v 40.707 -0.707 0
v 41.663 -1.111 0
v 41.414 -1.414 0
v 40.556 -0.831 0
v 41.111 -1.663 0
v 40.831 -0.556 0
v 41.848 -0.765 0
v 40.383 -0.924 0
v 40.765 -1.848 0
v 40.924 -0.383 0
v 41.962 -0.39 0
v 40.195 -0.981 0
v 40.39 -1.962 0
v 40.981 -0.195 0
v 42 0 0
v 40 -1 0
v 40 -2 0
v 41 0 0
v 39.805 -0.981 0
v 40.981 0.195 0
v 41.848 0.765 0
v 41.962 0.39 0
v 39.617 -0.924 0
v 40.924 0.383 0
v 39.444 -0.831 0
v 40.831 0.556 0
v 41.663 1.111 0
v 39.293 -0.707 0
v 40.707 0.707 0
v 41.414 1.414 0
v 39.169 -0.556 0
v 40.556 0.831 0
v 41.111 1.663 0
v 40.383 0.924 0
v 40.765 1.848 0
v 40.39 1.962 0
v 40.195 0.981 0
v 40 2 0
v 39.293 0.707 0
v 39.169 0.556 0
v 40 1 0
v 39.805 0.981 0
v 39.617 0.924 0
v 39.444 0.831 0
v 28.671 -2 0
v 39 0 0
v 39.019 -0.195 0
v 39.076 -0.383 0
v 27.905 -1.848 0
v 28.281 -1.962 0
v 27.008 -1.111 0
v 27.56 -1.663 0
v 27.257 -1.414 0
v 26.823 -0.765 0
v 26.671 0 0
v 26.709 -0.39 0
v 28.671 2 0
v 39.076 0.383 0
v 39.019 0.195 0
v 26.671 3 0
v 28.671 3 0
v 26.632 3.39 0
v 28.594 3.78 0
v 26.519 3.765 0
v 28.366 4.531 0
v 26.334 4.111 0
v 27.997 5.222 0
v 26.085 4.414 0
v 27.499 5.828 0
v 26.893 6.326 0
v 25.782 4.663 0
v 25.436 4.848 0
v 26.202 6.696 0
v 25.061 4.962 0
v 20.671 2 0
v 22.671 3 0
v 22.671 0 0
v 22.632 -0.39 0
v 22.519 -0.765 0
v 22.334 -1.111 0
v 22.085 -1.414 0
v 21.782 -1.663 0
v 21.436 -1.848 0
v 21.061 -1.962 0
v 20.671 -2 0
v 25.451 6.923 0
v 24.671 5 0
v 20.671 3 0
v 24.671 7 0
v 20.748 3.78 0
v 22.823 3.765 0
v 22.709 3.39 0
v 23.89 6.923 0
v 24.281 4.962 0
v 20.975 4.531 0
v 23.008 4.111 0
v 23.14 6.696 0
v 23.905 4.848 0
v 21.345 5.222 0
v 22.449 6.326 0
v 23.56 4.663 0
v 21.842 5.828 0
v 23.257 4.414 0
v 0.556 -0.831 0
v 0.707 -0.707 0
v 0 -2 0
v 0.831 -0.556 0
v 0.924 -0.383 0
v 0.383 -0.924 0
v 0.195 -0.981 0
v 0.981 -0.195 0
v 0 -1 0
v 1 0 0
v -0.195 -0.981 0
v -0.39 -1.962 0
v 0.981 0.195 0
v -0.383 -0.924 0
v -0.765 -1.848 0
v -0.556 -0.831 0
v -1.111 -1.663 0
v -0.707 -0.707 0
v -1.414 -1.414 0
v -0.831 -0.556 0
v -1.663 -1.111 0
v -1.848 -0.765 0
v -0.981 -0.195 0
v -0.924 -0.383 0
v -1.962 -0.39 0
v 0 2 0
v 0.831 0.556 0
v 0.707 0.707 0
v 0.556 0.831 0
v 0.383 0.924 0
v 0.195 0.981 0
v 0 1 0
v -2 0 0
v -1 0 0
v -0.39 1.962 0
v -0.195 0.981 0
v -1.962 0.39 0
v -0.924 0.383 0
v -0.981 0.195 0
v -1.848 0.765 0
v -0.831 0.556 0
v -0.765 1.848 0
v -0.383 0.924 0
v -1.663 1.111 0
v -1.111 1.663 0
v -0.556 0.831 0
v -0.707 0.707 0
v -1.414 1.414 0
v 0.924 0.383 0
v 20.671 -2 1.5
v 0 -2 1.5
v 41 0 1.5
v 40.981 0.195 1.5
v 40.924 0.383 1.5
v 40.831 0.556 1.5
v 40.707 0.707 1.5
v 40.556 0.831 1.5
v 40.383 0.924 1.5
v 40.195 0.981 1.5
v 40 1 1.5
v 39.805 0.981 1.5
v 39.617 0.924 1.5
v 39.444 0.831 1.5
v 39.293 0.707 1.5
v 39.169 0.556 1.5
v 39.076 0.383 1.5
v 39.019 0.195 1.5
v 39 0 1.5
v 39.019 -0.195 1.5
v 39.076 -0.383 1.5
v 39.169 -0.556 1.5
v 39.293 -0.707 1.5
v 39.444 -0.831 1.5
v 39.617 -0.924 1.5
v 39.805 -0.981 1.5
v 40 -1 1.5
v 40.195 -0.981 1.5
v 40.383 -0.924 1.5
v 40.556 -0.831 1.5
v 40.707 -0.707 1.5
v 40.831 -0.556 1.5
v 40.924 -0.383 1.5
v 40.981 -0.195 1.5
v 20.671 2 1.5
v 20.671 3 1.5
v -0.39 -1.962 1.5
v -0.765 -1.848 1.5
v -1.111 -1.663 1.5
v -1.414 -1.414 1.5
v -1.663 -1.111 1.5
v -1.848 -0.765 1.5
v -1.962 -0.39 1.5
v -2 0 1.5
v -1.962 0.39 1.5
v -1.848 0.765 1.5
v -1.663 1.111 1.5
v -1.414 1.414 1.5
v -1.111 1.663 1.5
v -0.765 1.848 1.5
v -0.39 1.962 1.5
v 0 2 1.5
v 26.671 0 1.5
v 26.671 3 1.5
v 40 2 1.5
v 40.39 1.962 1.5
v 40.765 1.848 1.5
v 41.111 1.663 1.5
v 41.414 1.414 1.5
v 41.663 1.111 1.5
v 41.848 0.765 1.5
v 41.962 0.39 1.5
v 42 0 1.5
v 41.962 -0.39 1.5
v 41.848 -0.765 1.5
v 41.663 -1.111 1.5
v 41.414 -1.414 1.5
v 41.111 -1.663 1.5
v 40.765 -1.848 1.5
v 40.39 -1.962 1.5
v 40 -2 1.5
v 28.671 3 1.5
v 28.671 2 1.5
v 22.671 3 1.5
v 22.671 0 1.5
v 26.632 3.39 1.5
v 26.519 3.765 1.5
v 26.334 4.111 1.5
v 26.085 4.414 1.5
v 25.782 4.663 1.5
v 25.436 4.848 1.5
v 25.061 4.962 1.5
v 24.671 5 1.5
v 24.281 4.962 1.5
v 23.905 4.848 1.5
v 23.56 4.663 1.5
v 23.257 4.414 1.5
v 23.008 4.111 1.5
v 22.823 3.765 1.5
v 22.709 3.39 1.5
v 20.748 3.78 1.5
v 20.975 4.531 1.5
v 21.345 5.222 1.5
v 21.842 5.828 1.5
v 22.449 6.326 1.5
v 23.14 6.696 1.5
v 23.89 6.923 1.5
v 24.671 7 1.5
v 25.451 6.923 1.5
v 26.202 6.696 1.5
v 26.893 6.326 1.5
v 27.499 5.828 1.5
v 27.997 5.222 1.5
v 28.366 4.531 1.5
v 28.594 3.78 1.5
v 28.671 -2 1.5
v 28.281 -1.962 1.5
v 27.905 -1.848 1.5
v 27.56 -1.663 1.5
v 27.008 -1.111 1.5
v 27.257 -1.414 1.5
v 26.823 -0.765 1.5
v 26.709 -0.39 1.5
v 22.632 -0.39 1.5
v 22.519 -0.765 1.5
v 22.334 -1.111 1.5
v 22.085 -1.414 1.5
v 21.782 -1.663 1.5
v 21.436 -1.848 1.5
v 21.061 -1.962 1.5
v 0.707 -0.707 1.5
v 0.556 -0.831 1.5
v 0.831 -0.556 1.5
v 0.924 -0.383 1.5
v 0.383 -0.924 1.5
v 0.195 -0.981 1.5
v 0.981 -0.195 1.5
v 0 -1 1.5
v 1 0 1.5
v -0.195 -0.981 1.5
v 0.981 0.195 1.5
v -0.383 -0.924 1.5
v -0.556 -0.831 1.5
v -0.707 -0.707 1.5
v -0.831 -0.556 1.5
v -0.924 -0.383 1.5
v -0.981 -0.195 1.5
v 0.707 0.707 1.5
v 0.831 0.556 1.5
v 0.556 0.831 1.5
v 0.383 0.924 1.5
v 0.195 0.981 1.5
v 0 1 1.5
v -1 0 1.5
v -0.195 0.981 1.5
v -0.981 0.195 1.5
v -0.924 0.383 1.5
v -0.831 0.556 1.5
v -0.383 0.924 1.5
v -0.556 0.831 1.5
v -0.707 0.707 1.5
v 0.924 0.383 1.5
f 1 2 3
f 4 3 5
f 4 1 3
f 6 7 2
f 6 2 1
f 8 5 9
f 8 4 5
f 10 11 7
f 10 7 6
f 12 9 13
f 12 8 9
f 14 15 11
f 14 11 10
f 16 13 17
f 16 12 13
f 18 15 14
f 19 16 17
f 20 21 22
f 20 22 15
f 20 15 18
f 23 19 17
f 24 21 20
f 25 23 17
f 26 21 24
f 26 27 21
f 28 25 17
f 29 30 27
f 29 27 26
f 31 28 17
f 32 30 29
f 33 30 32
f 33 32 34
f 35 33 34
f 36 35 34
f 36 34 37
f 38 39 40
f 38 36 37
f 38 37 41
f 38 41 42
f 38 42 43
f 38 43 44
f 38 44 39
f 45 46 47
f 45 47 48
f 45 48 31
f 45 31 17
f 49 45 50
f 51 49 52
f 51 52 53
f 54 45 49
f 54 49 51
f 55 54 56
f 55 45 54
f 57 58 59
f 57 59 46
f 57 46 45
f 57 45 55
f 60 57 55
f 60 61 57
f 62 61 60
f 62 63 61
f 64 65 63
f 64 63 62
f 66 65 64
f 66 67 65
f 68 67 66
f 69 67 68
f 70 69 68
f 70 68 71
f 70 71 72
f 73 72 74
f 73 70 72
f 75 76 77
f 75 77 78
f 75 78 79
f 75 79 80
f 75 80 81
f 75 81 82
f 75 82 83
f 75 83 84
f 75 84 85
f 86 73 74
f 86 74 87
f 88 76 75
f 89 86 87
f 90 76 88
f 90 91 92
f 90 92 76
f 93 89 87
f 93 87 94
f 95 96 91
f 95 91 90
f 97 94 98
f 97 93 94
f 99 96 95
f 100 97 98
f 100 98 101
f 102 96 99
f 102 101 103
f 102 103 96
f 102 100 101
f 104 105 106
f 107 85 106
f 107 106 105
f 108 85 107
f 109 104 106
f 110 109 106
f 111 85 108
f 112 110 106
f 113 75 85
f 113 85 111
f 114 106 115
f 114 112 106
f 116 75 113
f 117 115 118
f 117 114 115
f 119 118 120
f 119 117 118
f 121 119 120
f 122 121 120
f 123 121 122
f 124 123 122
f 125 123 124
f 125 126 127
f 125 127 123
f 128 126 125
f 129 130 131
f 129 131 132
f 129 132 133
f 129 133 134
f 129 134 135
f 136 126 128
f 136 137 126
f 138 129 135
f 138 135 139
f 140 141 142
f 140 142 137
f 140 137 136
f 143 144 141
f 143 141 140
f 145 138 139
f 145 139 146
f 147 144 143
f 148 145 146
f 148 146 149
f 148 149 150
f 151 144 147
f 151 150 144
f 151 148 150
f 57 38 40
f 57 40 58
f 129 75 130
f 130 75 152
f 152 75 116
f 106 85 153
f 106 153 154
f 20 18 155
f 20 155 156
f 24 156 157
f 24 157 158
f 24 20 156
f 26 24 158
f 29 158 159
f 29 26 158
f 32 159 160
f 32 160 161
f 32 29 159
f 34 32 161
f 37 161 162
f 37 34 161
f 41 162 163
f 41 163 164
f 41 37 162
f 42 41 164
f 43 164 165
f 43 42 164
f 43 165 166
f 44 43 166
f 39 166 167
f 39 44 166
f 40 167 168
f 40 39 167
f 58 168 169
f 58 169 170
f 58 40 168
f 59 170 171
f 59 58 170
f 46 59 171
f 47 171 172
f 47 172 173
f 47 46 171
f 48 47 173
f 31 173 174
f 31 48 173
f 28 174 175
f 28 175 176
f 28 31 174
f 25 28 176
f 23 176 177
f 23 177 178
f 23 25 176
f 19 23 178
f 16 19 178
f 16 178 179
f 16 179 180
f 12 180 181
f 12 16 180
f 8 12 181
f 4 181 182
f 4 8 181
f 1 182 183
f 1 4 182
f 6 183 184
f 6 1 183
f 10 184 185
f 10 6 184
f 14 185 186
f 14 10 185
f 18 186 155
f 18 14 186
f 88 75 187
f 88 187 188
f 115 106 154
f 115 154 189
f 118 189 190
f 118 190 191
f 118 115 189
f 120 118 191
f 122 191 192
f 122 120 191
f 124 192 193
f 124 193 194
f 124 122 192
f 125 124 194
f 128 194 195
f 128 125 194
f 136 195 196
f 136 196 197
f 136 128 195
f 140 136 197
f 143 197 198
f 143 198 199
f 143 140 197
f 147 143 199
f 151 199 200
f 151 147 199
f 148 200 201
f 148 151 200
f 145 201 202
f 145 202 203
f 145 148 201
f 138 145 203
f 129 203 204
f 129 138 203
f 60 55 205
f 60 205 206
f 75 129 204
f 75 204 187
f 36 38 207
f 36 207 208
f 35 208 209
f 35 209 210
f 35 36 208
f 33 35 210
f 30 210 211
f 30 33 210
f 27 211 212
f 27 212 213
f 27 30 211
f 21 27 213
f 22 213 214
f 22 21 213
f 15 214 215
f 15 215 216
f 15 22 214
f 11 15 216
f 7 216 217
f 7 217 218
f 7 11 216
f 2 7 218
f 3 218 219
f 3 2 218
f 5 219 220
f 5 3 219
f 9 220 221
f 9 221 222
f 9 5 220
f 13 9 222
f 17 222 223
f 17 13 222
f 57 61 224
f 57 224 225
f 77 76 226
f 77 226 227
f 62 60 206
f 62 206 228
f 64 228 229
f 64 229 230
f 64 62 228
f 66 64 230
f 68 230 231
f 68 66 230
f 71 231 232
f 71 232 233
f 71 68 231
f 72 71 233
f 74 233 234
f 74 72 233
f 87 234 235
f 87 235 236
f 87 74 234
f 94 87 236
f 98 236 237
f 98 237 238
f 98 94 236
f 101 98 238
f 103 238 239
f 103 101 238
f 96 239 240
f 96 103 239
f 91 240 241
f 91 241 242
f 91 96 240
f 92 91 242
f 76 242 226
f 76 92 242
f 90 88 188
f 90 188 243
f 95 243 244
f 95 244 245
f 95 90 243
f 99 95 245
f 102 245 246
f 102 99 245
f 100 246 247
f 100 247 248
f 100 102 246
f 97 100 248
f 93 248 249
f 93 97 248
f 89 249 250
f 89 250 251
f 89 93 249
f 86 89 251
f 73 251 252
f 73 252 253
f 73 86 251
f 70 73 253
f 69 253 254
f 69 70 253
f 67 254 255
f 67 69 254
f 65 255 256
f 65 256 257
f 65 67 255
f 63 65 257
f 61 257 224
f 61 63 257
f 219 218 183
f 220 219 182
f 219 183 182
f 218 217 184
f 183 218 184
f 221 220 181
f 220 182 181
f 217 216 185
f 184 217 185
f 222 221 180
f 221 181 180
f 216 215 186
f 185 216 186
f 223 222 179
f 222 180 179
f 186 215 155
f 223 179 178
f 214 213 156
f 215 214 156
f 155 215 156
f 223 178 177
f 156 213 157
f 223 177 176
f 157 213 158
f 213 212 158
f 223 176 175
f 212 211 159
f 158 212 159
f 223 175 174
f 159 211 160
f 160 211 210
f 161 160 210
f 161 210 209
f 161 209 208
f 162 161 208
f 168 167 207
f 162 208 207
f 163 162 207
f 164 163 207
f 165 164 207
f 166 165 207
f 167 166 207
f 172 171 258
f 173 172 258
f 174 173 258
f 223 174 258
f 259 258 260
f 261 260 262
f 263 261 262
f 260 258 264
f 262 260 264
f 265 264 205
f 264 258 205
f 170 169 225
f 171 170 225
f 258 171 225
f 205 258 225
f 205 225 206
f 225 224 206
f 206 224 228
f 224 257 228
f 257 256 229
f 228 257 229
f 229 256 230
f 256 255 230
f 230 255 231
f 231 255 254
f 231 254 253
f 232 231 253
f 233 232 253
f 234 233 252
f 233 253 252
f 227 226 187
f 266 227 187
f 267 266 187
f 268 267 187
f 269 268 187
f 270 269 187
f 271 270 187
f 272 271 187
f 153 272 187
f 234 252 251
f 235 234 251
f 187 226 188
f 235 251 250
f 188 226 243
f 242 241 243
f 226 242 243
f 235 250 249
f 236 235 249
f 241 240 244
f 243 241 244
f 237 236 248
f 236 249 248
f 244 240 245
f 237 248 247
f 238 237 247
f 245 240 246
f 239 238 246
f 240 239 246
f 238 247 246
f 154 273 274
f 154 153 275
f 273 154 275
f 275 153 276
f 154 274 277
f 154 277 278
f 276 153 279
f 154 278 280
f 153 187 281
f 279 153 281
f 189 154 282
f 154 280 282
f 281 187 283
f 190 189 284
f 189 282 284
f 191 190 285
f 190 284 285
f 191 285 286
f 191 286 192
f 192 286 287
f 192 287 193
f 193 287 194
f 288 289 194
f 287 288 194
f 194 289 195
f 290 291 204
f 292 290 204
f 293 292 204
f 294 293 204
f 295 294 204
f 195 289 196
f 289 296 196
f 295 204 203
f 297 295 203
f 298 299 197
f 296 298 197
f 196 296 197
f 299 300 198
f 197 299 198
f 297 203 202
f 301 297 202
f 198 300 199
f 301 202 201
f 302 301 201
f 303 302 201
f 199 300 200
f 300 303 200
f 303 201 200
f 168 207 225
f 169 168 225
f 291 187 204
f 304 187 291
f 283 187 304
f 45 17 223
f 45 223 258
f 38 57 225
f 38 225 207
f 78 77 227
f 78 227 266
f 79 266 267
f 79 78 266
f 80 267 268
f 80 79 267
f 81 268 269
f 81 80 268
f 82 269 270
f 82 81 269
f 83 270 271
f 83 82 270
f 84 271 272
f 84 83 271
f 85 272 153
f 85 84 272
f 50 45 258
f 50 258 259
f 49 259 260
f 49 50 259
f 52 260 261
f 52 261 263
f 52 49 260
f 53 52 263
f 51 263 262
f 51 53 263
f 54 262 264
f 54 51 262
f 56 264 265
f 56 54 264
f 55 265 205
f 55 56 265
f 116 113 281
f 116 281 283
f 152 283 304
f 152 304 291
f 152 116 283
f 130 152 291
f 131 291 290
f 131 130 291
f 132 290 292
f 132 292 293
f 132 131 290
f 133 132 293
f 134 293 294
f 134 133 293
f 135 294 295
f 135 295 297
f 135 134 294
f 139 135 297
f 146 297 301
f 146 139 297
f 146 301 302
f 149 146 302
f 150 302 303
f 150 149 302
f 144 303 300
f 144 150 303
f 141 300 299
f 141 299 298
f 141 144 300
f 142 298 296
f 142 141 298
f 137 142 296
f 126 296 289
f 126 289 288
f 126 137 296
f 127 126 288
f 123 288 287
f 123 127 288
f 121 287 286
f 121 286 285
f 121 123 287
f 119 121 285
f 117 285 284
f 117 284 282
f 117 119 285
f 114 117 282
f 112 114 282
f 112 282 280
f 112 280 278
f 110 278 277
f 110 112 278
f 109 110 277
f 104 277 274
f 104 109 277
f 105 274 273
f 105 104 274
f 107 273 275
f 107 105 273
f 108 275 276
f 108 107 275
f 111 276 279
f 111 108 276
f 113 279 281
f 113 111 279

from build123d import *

# Parameters (mm, degrees)
SKETCH_1_R      = 1
EXTRUDE_1_DEPTH = 1.5


with BuildPart() as part:
    # 草图1 → 凸台-拉伸1 (new body)
    with BuildSketch(Plane.XY):
        with BuildLine():
            Line((28.670799108, 2), (40, 2))
            ThreePointArc((40, 2), (42, 0), (40, -2))
            Line((40, -2), (28.670799108, -2))
            ThreePointArc((28.670799108, -2), (27.256585545, -1.414213562), (26.670799108, 0))
            Line((26.670799108, 0), (26.670799108, 3))
            ThreePointArc((26.670799108, 3), (24.670799108, 5), (22.670799108, 3))
            Line((22.670799108, 3), (22.670799108, 0))
            ThreePointArc((22.670799108, 0), (22.08501267, -1.414213562), (20.670799108, -2))
            Line((20.670799108, -2), (0, -2))
            ThreePointArc((0, -2), (-2, 0), (0, 2))
            Line((0, 2), (20.670799108, 2))
            Line((20.670799108, 2), (20.670799108, 3))
            ThreePointArc((20.670799108, 3), (24.670799108, 7), (28.670799108, 3))
            Line((28.670799108, 3), (28.670799108, 2))
        make_face()
        with Locations((40, 0)):
            Circle(SKETCH_1_R, mode=Mode.SUBTRACT)
        Circle(SKETCH_1_R, mode=Mode.SUBTRACT)
    extrude(amount=EXTRUDE_1_DEPTH)


solid = part.part
